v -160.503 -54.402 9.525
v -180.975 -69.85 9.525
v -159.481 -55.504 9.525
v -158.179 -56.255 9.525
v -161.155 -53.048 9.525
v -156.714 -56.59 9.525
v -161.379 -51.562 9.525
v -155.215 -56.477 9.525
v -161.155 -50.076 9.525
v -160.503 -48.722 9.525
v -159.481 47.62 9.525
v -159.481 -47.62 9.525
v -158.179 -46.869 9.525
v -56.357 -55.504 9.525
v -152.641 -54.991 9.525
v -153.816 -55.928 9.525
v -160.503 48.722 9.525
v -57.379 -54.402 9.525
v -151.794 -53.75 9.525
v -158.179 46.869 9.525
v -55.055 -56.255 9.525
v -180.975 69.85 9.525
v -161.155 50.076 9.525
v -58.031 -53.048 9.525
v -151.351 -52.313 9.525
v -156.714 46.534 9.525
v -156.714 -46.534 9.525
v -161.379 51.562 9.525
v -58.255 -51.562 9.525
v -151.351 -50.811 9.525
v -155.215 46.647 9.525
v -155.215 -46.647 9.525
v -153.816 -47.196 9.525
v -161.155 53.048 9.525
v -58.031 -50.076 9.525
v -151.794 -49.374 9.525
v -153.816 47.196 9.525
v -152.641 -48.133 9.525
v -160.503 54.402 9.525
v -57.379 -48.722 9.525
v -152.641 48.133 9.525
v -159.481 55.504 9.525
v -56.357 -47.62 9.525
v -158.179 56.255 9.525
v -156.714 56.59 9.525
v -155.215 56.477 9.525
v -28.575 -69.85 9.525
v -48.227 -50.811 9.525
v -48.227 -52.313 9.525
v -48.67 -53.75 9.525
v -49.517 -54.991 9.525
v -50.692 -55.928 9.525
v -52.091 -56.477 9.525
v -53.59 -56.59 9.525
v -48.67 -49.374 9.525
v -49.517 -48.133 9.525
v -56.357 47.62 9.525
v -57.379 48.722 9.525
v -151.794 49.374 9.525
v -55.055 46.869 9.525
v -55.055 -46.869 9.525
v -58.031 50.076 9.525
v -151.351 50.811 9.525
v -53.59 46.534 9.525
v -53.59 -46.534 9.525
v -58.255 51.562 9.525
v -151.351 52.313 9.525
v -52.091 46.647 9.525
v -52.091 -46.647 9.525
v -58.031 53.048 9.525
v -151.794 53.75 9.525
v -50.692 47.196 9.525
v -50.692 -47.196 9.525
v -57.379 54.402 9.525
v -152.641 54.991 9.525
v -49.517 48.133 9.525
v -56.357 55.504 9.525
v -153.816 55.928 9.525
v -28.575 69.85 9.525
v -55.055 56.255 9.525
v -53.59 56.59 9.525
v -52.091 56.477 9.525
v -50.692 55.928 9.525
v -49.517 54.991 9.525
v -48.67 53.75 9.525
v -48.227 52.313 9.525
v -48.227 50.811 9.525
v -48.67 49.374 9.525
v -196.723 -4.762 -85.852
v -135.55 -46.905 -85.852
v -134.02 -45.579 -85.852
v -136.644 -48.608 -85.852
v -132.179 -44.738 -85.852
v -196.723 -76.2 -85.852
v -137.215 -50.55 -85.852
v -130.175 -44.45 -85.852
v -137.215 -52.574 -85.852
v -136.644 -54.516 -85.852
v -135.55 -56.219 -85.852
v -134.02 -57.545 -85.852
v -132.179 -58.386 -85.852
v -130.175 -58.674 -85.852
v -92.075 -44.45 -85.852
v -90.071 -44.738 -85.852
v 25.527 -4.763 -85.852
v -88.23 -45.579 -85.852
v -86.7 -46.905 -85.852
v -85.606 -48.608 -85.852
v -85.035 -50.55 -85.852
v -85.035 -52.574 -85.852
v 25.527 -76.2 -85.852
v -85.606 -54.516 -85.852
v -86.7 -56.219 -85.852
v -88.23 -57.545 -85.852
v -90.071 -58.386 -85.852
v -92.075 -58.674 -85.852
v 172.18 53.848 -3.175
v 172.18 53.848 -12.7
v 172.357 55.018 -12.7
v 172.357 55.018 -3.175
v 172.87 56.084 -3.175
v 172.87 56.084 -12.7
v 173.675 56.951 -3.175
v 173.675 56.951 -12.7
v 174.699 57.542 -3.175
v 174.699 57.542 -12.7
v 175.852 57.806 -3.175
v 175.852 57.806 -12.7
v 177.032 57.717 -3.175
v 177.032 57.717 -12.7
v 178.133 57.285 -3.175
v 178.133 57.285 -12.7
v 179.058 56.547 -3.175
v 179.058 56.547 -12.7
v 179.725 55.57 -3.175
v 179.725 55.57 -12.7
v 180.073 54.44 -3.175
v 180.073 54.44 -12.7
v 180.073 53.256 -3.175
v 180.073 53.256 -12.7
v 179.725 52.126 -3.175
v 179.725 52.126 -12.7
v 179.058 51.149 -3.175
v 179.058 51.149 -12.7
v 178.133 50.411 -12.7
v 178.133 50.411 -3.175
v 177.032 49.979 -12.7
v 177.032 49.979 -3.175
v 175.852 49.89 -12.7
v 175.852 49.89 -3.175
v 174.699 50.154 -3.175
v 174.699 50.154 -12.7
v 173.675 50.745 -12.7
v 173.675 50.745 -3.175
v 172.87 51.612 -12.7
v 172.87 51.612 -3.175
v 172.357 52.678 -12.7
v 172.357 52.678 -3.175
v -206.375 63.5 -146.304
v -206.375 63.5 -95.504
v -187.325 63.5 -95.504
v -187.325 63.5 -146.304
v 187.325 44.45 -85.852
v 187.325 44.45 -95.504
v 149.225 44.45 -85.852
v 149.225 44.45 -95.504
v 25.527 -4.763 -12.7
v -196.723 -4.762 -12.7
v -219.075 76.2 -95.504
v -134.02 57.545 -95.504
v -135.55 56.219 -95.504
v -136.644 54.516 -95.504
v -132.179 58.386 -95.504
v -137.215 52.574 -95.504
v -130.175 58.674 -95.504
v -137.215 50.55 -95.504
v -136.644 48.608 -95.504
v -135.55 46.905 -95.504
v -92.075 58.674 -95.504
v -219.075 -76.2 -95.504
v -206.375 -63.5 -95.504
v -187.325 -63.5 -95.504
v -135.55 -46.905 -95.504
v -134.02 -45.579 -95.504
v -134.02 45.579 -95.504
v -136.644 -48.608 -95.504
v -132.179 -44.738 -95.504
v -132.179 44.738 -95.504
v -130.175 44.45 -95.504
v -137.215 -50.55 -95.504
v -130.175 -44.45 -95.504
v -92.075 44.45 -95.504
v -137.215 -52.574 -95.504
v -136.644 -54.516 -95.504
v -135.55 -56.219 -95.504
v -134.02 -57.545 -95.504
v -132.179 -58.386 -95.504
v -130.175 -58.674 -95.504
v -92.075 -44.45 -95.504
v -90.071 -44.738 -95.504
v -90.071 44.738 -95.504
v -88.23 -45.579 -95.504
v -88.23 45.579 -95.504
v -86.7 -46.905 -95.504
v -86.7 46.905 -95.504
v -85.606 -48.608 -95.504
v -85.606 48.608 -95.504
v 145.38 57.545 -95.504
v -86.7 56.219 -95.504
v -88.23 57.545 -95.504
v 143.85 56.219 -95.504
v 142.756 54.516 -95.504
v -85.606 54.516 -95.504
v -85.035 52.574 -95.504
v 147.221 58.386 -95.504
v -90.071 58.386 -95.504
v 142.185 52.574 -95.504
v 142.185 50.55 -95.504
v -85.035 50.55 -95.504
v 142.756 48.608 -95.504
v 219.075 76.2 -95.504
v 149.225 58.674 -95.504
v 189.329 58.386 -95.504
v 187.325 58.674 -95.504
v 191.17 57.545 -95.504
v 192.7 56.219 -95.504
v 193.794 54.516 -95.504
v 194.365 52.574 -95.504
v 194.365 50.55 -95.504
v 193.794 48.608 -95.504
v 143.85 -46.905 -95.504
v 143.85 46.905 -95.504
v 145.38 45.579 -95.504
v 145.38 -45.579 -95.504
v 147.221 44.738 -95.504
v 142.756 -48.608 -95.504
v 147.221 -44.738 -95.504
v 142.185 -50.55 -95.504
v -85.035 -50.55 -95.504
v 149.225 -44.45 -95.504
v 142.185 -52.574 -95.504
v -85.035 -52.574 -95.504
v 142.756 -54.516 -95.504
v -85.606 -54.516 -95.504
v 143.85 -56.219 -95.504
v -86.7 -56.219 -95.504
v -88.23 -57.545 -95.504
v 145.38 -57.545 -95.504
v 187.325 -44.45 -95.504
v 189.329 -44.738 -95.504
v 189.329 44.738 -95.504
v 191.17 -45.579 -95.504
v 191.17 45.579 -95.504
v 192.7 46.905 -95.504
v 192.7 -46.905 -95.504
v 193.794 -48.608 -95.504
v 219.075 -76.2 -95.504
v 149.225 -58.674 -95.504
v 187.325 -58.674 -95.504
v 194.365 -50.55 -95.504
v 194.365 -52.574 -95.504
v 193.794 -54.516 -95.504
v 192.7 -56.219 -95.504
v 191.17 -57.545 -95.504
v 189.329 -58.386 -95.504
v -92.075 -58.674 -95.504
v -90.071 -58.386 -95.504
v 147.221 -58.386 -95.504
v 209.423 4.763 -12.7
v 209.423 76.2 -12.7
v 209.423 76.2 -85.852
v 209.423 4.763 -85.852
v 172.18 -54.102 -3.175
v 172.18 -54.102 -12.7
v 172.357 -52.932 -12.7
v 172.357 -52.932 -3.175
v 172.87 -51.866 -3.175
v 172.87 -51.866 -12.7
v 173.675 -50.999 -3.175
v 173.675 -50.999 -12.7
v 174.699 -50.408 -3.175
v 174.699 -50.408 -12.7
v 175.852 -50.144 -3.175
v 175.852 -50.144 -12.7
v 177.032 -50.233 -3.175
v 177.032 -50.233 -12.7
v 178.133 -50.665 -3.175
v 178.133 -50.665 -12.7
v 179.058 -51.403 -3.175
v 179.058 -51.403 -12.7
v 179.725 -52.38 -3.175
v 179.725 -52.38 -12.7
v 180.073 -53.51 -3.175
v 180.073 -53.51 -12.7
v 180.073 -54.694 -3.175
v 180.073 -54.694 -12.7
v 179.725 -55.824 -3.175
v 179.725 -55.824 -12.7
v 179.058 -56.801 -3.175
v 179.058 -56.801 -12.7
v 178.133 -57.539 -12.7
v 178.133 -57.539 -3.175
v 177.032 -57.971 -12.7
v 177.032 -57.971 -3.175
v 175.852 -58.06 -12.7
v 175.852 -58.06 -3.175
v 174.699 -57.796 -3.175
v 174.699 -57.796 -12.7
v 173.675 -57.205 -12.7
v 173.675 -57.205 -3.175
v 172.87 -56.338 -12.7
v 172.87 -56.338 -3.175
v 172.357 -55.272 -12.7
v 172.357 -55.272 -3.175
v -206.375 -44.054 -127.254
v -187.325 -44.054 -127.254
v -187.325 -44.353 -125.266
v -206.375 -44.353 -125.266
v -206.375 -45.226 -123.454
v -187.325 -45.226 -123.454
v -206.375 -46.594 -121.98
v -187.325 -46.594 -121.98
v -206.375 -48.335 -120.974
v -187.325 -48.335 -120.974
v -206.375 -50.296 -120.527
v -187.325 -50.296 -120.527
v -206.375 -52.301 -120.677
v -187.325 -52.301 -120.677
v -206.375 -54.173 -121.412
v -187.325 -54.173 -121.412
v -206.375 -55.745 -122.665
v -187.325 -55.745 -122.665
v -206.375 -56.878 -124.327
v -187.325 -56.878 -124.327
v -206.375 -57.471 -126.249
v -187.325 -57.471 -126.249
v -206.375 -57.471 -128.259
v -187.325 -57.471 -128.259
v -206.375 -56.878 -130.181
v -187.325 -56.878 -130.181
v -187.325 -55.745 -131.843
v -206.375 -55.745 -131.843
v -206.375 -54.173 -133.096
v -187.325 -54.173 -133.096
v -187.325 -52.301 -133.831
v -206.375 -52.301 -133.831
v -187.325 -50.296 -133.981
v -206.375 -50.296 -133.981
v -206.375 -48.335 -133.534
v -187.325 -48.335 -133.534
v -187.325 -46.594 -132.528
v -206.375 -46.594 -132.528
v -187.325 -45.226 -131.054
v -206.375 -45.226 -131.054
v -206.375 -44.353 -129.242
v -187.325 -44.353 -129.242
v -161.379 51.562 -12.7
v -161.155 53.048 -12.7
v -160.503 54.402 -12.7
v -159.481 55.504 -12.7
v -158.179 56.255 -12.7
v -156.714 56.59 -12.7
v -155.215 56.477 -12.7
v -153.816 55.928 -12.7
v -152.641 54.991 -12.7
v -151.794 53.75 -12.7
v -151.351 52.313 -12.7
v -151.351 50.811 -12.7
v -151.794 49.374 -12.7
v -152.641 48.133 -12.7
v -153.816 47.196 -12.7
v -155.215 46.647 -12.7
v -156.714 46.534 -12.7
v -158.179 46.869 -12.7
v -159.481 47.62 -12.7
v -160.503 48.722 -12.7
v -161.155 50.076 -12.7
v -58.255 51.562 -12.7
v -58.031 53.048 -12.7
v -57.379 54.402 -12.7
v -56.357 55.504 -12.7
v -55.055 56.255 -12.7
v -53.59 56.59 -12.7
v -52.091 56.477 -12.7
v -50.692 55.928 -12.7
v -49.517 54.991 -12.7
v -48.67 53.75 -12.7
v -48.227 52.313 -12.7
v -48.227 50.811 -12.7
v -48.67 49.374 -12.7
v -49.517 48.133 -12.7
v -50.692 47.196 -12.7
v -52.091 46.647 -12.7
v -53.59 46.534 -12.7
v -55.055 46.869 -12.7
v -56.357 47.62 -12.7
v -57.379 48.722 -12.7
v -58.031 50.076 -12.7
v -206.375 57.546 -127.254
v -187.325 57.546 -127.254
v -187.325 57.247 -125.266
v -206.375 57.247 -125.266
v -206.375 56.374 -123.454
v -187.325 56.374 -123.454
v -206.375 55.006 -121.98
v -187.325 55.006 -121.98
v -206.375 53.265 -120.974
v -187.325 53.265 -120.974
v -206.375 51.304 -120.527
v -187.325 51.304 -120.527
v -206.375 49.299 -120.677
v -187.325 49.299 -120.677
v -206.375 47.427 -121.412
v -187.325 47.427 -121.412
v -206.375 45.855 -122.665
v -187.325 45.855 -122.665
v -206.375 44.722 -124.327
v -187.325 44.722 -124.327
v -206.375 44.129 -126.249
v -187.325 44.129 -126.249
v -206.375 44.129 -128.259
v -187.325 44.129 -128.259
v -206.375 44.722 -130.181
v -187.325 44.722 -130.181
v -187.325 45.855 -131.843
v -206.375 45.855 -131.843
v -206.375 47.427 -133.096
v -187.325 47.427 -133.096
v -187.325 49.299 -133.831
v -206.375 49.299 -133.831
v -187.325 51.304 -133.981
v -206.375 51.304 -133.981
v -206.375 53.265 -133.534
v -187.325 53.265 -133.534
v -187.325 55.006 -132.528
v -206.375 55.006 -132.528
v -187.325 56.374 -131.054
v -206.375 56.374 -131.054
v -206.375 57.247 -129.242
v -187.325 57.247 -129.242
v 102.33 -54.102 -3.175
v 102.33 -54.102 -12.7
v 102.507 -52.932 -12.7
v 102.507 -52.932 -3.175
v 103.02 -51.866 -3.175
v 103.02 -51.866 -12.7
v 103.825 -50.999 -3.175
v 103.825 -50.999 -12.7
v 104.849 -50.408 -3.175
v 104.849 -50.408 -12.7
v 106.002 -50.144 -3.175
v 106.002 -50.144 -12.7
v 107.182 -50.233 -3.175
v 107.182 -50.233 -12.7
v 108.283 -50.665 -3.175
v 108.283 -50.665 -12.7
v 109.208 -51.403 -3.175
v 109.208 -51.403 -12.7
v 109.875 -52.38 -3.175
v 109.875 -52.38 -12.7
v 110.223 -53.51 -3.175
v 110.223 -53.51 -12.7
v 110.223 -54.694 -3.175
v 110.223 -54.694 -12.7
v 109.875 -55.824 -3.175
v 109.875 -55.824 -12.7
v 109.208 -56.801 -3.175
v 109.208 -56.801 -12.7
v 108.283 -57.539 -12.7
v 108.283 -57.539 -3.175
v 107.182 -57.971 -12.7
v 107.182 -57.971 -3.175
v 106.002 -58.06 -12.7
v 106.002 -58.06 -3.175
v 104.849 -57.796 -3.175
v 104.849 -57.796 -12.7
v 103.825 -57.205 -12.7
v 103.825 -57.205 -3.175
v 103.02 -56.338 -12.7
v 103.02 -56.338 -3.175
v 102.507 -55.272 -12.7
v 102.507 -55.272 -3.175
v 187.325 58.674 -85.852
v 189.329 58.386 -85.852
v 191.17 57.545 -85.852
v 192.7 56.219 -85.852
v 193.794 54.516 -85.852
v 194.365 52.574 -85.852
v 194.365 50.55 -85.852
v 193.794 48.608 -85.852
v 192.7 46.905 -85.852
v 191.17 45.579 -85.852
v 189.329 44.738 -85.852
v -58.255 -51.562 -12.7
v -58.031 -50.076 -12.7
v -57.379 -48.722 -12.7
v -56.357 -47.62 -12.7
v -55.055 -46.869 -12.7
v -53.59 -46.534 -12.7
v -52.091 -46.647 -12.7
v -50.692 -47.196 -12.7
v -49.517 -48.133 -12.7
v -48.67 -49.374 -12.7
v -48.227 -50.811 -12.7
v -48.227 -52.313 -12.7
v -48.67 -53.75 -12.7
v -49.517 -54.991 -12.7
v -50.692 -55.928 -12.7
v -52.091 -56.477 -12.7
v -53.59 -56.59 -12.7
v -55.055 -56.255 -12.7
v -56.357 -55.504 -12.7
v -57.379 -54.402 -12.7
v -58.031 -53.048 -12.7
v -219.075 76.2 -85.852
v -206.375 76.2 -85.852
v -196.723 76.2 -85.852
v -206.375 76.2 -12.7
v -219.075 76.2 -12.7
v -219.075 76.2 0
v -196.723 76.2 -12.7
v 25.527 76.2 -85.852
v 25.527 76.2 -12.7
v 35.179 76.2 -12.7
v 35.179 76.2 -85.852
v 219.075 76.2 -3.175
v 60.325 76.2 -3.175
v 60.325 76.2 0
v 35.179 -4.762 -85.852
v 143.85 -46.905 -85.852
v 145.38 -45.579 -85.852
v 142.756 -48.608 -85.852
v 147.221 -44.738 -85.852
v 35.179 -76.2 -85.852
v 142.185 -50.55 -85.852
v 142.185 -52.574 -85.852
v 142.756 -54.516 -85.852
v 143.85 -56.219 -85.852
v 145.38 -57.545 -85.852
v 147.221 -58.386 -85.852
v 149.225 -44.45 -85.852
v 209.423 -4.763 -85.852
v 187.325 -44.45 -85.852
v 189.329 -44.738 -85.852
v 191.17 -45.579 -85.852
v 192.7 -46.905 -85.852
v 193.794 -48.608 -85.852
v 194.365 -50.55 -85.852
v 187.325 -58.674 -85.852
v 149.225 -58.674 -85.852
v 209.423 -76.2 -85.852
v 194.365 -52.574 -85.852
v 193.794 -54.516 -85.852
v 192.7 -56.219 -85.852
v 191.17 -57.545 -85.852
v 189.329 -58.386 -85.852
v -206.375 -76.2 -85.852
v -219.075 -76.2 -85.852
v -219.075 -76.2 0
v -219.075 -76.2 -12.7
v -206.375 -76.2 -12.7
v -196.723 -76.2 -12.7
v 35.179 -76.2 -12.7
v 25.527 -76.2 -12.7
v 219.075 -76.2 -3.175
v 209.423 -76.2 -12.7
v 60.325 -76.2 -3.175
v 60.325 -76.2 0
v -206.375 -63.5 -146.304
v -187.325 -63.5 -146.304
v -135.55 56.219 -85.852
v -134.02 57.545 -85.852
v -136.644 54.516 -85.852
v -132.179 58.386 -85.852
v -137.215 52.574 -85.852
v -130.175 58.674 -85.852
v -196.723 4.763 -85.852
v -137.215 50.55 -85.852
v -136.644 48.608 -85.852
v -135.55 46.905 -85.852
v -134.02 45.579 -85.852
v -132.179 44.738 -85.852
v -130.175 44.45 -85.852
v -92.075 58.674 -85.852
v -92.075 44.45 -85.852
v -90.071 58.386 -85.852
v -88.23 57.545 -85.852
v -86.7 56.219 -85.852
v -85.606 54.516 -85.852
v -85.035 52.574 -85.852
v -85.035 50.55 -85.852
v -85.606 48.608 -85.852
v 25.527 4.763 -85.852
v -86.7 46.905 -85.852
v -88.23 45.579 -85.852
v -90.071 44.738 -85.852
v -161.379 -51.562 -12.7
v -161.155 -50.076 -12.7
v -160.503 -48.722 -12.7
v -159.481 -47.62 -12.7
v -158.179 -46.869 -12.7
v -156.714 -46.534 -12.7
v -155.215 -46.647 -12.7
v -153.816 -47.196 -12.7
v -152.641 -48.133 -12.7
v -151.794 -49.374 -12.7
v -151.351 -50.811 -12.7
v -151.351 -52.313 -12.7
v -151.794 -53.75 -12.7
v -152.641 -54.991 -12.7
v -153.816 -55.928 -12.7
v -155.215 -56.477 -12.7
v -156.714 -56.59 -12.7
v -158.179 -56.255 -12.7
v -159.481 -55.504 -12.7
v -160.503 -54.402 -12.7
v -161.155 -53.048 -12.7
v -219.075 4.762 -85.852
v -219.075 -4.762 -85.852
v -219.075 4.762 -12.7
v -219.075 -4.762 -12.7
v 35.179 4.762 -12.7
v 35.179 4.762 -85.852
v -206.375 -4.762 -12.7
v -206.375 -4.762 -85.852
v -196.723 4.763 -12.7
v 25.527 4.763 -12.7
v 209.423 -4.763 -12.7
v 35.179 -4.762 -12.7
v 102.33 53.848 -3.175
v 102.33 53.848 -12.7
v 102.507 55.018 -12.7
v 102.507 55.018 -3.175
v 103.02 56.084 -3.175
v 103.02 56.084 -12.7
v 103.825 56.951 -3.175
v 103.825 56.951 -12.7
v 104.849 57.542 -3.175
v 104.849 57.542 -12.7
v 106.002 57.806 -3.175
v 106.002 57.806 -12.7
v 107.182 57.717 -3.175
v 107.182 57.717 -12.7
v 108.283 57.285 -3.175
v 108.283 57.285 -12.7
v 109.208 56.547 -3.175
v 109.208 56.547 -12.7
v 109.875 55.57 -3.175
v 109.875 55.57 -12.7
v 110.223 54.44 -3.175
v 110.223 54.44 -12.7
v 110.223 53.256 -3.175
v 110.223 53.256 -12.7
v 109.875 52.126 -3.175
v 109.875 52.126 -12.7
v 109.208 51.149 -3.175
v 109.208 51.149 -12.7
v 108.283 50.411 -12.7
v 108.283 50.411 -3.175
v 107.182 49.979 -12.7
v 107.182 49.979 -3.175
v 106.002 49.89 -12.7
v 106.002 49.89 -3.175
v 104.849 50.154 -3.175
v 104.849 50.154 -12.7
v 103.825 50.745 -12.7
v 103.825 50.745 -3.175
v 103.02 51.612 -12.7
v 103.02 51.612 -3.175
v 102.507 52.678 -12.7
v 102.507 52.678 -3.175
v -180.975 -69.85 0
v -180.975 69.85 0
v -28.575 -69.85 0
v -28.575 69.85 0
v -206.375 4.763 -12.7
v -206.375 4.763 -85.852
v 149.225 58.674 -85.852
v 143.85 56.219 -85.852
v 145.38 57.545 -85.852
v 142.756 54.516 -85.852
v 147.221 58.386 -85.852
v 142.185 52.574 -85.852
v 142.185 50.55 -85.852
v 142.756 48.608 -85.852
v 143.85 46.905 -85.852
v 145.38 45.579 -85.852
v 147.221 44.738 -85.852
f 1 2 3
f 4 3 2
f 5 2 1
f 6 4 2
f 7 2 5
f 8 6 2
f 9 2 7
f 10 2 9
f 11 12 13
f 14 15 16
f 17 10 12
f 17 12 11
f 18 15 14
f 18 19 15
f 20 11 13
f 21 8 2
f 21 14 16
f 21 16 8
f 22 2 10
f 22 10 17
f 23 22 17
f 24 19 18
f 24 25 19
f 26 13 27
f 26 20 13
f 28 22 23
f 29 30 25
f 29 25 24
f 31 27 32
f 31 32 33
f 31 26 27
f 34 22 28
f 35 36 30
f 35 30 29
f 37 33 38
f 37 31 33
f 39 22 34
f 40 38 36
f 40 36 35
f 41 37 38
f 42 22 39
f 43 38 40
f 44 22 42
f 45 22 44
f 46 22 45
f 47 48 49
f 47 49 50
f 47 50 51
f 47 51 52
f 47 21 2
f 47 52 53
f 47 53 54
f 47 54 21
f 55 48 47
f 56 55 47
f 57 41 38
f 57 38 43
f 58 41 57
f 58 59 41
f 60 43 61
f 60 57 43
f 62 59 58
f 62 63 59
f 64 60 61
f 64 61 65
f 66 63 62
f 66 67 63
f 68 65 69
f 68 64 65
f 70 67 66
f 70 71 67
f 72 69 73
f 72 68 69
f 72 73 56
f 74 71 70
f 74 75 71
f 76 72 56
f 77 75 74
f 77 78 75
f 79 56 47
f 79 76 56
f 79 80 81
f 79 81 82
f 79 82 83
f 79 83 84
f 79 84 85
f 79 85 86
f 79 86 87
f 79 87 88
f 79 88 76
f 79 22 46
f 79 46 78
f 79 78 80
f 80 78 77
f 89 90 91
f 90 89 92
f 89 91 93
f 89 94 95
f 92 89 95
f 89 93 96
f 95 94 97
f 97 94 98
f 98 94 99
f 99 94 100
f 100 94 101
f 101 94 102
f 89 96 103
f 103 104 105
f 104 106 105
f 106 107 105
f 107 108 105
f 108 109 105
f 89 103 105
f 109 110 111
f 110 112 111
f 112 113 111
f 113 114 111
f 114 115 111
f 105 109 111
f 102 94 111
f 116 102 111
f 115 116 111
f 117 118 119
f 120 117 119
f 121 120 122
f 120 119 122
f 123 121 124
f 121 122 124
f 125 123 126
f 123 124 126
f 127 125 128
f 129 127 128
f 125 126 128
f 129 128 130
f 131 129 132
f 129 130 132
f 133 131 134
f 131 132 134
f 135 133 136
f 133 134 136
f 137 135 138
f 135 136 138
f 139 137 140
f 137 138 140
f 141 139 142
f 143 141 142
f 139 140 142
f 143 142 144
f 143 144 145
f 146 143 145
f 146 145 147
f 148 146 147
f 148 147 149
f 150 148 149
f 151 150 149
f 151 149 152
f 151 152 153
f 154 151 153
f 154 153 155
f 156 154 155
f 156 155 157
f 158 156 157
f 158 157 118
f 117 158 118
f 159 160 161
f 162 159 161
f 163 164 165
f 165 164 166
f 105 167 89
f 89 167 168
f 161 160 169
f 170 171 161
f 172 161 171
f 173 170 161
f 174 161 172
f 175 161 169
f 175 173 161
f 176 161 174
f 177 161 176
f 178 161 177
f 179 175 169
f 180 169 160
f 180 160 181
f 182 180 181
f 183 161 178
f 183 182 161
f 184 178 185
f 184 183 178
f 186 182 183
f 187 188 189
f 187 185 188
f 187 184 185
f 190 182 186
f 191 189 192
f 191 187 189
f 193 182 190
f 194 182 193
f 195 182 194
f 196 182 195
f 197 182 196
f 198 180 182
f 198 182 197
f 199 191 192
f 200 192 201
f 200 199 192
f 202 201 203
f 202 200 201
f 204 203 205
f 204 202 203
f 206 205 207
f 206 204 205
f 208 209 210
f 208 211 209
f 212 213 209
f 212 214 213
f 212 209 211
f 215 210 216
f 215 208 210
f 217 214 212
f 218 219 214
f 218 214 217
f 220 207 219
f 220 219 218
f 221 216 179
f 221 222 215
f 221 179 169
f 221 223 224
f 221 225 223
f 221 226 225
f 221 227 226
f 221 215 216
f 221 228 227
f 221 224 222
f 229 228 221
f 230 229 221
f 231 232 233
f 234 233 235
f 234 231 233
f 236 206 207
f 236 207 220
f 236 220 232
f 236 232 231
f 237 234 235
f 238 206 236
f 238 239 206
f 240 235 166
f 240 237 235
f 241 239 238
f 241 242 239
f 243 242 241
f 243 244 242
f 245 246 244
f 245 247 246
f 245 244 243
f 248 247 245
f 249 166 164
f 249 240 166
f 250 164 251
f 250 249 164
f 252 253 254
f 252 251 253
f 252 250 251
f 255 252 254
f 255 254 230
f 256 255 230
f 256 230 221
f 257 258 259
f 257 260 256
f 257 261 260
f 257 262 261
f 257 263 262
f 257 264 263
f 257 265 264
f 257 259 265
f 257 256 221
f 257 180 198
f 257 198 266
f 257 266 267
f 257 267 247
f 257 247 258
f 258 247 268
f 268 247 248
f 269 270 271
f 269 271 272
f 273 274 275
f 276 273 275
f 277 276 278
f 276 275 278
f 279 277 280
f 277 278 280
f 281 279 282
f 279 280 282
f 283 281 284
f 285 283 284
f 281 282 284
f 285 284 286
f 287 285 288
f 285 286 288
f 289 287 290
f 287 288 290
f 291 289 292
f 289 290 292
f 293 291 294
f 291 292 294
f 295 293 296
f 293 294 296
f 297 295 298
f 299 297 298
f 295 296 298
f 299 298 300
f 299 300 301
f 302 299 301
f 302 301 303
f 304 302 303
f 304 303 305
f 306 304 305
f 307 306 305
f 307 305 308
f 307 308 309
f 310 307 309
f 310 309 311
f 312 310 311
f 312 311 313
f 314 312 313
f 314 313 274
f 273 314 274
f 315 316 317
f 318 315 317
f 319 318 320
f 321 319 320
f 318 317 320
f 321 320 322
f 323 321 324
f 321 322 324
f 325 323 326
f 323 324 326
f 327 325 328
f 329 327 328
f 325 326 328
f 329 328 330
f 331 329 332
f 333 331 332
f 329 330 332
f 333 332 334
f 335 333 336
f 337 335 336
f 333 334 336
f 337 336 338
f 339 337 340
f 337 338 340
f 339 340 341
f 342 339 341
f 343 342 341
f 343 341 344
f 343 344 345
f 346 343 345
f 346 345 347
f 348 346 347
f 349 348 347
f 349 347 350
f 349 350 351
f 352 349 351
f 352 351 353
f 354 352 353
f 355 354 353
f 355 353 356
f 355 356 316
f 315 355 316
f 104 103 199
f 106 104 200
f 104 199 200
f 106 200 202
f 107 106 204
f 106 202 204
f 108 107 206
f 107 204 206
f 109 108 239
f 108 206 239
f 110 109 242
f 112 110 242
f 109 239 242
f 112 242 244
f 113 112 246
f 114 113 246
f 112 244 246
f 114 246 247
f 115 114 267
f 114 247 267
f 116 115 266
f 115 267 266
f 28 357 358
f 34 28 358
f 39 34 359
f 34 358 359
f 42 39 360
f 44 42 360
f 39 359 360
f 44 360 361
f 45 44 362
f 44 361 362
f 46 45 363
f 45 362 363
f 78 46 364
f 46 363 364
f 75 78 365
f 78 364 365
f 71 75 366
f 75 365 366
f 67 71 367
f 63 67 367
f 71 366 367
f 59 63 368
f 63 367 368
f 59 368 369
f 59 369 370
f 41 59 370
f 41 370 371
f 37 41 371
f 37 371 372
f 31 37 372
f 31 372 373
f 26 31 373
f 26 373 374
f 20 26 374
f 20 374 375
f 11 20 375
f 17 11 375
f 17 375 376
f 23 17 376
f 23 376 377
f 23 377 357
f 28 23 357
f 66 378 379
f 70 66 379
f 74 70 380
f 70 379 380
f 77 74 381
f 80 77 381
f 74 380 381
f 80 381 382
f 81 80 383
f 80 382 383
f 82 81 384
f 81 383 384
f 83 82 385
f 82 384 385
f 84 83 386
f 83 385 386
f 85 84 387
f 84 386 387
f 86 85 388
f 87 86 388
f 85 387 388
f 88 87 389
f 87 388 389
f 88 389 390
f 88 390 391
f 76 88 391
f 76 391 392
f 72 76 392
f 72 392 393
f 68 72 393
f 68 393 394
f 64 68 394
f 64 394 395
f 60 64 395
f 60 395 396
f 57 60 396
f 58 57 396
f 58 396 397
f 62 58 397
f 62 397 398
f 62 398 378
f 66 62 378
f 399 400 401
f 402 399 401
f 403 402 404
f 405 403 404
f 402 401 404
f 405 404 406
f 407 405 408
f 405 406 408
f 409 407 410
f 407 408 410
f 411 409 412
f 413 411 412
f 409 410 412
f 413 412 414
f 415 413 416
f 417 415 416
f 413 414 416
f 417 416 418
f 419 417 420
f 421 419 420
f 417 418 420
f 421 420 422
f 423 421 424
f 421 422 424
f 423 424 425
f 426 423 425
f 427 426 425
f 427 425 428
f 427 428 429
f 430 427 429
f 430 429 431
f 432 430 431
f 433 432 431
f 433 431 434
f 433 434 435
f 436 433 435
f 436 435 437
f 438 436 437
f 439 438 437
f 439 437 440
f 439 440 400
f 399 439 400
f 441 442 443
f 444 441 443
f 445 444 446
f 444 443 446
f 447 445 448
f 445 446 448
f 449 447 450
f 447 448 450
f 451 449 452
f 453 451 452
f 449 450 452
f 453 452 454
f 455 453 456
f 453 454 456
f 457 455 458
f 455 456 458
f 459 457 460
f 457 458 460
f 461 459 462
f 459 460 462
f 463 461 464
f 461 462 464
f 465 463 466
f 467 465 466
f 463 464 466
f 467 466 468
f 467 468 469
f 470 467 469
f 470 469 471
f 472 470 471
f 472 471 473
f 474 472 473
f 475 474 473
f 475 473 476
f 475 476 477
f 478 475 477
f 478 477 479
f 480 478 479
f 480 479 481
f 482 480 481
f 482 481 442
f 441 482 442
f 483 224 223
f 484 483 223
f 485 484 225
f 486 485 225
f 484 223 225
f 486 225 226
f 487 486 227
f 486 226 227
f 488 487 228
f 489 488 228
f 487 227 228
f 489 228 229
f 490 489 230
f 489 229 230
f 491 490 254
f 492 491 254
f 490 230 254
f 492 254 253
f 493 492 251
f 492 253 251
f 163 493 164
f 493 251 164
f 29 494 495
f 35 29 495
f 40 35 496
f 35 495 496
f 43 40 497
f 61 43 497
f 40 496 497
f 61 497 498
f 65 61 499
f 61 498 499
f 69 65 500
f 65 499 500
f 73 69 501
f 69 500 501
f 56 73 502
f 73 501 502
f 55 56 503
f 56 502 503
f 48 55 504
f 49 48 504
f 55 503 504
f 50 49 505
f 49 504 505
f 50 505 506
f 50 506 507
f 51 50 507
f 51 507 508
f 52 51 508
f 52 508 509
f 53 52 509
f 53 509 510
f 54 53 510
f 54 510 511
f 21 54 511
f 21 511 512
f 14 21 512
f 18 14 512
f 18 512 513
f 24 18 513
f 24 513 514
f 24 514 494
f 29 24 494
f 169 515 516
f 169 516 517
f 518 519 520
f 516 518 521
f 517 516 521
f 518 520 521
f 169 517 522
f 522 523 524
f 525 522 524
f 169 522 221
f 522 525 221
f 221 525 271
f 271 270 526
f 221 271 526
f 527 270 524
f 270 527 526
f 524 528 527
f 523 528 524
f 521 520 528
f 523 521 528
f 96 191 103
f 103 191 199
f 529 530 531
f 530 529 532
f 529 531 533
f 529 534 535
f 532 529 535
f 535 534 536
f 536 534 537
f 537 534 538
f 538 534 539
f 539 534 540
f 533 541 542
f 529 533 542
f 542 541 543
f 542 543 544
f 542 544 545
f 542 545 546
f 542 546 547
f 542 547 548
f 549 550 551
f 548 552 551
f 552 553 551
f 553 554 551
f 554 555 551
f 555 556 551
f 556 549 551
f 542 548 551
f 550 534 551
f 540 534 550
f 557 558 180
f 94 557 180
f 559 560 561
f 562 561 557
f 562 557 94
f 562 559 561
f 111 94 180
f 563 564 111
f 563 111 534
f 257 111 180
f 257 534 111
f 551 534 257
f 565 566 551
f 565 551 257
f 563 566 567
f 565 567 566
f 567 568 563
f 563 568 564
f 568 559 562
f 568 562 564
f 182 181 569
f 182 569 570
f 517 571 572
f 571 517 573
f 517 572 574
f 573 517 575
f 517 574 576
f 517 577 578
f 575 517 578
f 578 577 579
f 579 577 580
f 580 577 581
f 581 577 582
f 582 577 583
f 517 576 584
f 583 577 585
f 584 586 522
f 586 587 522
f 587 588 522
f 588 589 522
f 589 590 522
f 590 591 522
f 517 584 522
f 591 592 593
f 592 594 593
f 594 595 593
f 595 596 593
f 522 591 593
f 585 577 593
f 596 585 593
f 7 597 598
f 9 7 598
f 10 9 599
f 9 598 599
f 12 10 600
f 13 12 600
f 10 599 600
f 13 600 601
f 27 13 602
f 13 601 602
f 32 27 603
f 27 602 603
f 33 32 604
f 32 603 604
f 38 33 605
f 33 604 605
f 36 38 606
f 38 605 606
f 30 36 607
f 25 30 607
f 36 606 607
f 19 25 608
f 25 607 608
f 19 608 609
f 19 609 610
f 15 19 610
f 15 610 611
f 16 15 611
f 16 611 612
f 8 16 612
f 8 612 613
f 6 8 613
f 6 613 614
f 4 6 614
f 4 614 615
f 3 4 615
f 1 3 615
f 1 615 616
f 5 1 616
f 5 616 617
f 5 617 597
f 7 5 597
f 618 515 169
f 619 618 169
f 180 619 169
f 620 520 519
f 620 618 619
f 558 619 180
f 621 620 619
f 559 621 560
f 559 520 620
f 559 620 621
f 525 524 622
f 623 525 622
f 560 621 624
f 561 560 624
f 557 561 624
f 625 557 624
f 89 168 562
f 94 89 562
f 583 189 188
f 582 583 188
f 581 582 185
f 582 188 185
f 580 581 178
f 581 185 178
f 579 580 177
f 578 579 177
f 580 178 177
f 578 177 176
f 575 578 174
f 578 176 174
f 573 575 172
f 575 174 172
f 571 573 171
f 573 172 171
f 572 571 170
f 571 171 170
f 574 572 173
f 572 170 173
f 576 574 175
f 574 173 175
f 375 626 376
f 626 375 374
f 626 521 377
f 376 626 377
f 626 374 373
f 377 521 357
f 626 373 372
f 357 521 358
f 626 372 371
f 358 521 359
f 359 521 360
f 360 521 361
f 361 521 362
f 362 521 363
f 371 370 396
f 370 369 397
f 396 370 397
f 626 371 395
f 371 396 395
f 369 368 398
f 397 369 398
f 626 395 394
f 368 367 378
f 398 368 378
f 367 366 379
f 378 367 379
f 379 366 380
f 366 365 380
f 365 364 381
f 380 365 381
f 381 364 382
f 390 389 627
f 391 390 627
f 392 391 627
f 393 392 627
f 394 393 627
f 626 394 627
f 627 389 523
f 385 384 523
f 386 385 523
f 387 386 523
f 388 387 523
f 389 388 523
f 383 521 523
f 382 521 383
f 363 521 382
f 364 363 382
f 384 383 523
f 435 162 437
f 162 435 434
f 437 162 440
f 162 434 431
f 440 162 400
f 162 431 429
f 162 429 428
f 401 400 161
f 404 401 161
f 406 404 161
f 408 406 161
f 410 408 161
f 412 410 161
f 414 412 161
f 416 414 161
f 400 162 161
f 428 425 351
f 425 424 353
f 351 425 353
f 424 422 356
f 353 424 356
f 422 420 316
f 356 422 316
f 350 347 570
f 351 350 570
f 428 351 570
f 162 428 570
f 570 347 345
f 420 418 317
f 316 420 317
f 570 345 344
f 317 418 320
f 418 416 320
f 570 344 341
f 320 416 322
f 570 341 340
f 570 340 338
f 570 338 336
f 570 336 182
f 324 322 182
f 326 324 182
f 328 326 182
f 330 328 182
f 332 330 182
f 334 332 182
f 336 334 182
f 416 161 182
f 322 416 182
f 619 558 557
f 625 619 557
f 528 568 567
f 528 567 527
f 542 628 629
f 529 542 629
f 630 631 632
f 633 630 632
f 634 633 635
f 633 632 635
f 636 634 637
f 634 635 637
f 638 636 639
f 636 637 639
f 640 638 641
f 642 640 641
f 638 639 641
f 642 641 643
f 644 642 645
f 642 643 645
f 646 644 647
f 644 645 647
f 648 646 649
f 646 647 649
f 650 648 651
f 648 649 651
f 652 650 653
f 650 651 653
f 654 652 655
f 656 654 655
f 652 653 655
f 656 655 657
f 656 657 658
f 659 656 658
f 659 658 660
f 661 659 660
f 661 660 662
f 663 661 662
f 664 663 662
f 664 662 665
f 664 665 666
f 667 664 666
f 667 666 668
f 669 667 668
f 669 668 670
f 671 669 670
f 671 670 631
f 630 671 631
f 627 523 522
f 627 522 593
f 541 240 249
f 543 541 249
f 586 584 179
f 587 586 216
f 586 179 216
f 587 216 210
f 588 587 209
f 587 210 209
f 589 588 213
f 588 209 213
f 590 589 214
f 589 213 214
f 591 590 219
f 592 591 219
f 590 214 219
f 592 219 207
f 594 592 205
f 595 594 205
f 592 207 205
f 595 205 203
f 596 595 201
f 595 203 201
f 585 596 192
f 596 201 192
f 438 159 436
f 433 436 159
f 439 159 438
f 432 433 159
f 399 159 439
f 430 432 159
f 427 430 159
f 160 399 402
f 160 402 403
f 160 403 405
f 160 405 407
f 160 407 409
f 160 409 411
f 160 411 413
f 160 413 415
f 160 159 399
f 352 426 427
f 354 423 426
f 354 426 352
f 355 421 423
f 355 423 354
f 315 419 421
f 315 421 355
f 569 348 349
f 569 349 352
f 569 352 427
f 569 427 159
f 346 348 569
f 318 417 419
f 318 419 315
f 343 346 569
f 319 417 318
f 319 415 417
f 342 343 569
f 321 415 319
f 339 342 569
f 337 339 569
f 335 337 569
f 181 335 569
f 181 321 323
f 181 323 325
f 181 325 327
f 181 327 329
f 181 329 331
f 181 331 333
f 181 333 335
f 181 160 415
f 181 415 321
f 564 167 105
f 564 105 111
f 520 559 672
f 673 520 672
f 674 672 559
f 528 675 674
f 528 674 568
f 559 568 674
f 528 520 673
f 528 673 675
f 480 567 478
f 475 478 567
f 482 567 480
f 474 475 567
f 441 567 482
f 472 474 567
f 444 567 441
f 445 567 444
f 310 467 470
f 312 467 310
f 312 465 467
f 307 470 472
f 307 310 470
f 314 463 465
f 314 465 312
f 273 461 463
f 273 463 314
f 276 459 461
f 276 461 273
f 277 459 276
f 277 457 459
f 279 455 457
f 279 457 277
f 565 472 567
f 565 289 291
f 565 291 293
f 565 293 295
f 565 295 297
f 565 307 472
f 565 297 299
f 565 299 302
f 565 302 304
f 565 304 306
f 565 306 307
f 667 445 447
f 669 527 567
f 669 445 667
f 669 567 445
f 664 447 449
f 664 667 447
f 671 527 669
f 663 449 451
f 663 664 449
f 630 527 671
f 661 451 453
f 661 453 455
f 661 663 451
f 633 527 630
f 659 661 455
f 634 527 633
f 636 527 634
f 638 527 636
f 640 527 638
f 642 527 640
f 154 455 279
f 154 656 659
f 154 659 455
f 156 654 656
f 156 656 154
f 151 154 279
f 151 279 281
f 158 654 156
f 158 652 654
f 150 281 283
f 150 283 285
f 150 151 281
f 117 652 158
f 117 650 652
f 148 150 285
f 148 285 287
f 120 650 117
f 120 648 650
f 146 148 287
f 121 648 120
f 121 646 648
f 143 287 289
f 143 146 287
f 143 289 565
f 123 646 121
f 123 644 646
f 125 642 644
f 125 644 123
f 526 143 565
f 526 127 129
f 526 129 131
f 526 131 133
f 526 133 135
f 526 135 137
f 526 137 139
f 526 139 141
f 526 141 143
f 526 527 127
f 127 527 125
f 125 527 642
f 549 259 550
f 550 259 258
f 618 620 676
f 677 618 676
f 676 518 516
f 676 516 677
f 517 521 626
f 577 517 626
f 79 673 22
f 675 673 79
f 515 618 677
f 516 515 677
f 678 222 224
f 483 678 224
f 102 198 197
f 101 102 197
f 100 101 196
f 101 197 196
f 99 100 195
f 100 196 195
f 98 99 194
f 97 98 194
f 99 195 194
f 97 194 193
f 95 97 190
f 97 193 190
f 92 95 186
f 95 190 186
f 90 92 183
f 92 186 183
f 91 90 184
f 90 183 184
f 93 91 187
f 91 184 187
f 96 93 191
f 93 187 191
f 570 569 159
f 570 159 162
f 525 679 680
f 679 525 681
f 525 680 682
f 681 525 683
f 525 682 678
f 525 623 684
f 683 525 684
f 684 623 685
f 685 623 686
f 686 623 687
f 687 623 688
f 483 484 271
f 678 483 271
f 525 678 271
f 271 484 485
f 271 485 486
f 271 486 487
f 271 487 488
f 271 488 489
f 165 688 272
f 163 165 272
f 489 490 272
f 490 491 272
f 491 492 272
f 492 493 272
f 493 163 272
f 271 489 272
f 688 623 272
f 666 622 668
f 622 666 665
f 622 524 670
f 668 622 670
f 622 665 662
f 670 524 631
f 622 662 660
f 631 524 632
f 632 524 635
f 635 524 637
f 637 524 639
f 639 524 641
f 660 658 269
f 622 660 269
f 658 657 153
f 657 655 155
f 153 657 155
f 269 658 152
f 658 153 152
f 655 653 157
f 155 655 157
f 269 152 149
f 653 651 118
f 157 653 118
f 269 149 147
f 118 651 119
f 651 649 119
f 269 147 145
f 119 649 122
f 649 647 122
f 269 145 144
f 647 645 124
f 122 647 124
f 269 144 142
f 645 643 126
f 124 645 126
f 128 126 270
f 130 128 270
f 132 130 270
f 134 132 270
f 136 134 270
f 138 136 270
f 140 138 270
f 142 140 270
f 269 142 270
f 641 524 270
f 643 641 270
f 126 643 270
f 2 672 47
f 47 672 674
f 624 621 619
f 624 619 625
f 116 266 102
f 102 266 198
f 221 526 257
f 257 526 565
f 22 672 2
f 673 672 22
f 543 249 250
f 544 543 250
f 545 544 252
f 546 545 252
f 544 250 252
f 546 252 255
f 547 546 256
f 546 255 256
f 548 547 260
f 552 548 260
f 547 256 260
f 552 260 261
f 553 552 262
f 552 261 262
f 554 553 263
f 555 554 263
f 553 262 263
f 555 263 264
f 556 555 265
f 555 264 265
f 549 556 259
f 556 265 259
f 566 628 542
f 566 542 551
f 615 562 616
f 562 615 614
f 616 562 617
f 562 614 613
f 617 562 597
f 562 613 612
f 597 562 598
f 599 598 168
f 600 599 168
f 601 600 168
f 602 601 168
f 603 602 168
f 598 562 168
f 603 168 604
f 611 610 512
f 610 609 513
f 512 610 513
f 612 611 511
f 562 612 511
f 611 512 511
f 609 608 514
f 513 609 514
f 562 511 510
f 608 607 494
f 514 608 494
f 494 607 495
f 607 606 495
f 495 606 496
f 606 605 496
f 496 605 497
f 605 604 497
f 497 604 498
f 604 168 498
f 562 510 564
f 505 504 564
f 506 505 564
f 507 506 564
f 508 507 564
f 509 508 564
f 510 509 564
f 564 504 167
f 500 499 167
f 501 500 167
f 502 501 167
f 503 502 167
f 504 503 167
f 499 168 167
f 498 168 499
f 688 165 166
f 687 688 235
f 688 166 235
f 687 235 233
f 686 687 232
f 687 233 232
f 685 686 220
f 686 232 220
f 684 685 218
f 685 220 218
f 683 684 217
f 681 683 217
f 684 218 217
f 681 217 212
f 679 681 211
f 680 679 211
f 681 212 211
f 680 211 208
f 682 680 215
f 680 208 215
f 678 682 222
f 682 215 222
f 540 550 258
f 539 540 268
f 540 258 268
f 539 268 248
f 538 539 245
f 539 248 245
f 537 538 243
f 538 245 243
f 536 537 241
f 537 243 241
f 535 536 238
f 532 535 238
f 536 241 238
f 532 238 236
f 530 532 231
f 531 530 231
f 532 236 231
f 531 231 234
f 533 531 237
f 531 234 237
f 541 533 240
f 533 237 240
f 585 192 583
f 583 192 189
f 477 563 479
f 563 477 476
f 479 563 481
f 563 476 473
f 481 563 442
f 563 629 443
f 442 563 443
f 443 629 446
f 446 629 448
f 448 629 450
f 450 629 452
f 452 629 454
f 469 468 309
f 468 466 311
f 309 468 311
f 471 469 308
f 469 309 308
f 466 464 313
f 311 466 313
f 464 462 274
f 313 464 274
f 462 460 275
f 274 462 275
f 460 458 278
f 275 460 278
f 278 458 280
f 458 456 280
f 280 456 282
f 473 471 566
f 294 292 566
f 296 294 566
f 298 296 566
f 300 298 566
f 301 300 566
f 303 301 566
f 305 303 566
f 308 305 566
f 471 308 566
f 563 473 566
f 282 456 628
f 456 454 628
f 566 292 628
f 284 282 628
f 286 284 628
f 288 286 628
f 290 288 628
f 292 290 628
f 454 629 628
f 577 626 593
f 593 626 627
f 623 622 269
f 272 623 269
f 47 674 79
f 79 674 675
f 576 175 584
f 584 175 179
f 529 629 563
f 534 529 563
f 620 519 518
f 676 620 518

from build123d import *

# Parameters (mm, degrees)
F0_W      = 438.15
F0_H      = 152.4
F1_DEPTH  = 12.7
F2_W      = 152.4
F2_H      = 139.7
F3_DEPTH  = 9.525
F4_W      = 9.652
F4_H      = 71.4375
F4_H_2    = 9.525
F4_W_2    = 12.7
F4_W_3    = 222.25
F4_W_4    = 174.244
F5_DEPTH  = 73.152
F6_W      = 438.15
F6_H      = 152.4
F7_DEPTH  = 9.652
F9_DEPTH  = 25.4
F11_D     = 10.0838
F11_DEPTH = 38.1
F11_TIP   = 3.0294791551
F12_W     = 158.75
F12_H     = 152.4
F13_DEPTH = 3.175
F15_D     = 7.9375
F15_DEPTH = 38.1
F15_TIP   = 2.3846655818
F16_W     = 19.05
F16_H     = 127
F17_DEPTH = 50.8
F19_D     = 13.49248
F19_DEPTH = 21.2274727273
F19_TIP   = 4.0535499425


with BuildPart() as f1:
    # F0 (on Top) → F1 (new body)
    with BuildSketch(Plane.XY):
        Rectangle(F0_W, F0_H)
    extrude(amount=-F1_DEPTH)

    # F2 (on face) → F3 (join)
    with BuildSketch(Plane.XY):
        with Locations((-104.775, 0)):
            Rectangle(F2_W, F2_H)
    extrude(amount=F3_DEPTH)

    # F4 (on face) → F5 (join)
    with BuildSketch(Plane(origin=(0, 0, -12.7), x_dir=(1, 0, 0), z_dir=(0, 0, -1))):
        with Locations((-201.549, 40.48125)):
            Rectangle(F4_W, F4_H)
        with Locations((-201.549, 0)):
            Rectangle(F4_W, F4_H_2)
        with Locations((-212.725, 0)):
            Rectangle(F4_W_2, F4_H_2)
        with Locations((-85.598, 0)):
            Rectangle(F4_W_3, F4_H_2)
        with Locations((-201.549, -40.48125)):
            Rectangle(F4_W, F4_H)
        with Locations((30.353, 0)):
            Rectangle(F4_W, F4_H_2)
        with Locations((30.353, 40.48125)):
            Rectangle(F4_W, F4_H)
        with Locations((30.353, -40.48125)):
            Rectangle(F4_W, F4_H)
        with Locations((122.301, 0)):
            Rectangle(F4_W_4, F4_H_2)
        with Locations((214.249, 0)):
            Rectangle(F4_W, F4_H_2)
        with Locations((214.249, 40.48125)):
            Rectangle(F4_W, F4_H)
        with Locations((214.249, -40.48125)):
            Rectangle(F4_W, F4_H)
    extrude(amount=F5_DEPTH)

    # F6 (on face) → F7 (join)
    with BuildSketch(Plane(origin=(0, 0, -85.852), x_dir=(1, 0, 0), z_dir=(0, 0, -1))):
        Rectangle(F6_W, F6_H)
    extrude(amount=F7_DEPTH)

    # F8 (on face) → F9 (cut)
    with BuildSketch(Plane(origin=(0, 0, -95.504), x_dir=(1, 0, 0), z_dir=(0, 0, -1))):
        with BuildLine():
            Line((-130.175, 44.45), (-92.075, 44.45))
            ThreePointArc((-92.075, 44.45), (-84.963, 51.562), (-92.075, 58.674))
            Line((-92.075, 58.674), (-130.175, 58.674))
            ThreePointArc((-130.175, 58.674), (-137.287, 51.562), (-130.175, 44.45))
        make_face()
        with BuildLine():
            ThreePointArc((-130.175, -44.45), (-137.287, -51.562), (-130.175, -58.674))
            Line((-130.175, -58.674), (-92.075, -58.674))
            ThreePointArc((-92.075, -58.674), (-84.963, -51.562), (-92.075, -44.45))
            Line((-92.075, -44.45), (-130.175, -44.45))
        make_face()
        with BuildLine():
            Line((187.325, 58.674), (149.225, 58.674))
            ThreePointArc((149.225, 58.674), (142.113, 51.562), (149.225, 44.45))
            Line((149.225, 44.45), (187.325, 44.45))
            ThreePointArc((187.325, 44.45), (194.437, 51.562), (187.325, 58.674))
        make_face()
        with BuildLine():
            ThreePointArc((149.225, -44.45), (142.113, -51.562), (149.225, -58.674))
            Line((149.225, -58.674), (187.325, -58.674))
            ThreePointArc((187.325, -58.674), (194.437, -51.562), (187.325, -44.45))
            Line((187.325, -44.45), (149.225, -44.45))
        make_face()
    extrude(amount=-F9_DEPTH, mode=Mode.SUBTRACT)

    # F11
    with Locations(Plane.XY.offset(9.525)):
        with Locations((-156.337, 51.562), (-53.213, 51.562), (-156.337, -51.562), (-53.213, -51.562)):
            Hole(F11_D / 2, depth=F11_DEPTH)
            with Locations((0, 0, -(F11_DEPTH + F11_TIP / 2))):  # 118° drill point
                Cone(0, F11_D / 2, F11_TIP, mode=Mode.SUBTRACT)

    # F12 (on face) → F13 (cut)
    with BuildSketch(Plane.XY):
        with Locations((139.7, 0)):
            Rectangle(F12_W, F12_H)
    extrude(amount=-F13_DEPTH, mode=Mode.SUBTRACT)

    # F15
    with Locations(Plane.XY.offset(-3.175)):
        with Locations((106.299, 53.848), (176.149, 53.848), (176.149, -54.102), (106.299, -54.102)):
            Hole(F15_D / 2, depth=F15_DEPTH)
            with Locations((0, 0, -(F15_DEPTH + F15_TIP / 2))):  # 118° drill point
                Cone(0, F15_D / 2, F15_TIP, mode=Mode.SUBTRACT)

    # F16 (on face) → F17 (join)
    with BuildSketch(Plane(origin=(0, 0, -95.504), x_dir=(1, 0, 0), z_dir=(0, 0, -1))):
        with Locations((-196.85, 0)):
            Rectangle(F16_W, F16_H)
    extrude(amount=F17_DEPTH)

    # F19
    with Locations(Plane(origin=(-206.375, 0, 0), x_dir=(0, -1, 0), z_dir=(-1, 0, 0))):
        with Locations((50.8, -127.254), (-50.8, -127.254)):
            Hole(F19_D / 2, depth=F19_DEPTH)
            with Locations((0, 0, -(F19_DEPTH + F19_TIP / 2))):  # 118° drill point
                Cone(0, F19_D / 2, F19_TIP, mode=Mode.SUBTRACT)


solid = f1.part
